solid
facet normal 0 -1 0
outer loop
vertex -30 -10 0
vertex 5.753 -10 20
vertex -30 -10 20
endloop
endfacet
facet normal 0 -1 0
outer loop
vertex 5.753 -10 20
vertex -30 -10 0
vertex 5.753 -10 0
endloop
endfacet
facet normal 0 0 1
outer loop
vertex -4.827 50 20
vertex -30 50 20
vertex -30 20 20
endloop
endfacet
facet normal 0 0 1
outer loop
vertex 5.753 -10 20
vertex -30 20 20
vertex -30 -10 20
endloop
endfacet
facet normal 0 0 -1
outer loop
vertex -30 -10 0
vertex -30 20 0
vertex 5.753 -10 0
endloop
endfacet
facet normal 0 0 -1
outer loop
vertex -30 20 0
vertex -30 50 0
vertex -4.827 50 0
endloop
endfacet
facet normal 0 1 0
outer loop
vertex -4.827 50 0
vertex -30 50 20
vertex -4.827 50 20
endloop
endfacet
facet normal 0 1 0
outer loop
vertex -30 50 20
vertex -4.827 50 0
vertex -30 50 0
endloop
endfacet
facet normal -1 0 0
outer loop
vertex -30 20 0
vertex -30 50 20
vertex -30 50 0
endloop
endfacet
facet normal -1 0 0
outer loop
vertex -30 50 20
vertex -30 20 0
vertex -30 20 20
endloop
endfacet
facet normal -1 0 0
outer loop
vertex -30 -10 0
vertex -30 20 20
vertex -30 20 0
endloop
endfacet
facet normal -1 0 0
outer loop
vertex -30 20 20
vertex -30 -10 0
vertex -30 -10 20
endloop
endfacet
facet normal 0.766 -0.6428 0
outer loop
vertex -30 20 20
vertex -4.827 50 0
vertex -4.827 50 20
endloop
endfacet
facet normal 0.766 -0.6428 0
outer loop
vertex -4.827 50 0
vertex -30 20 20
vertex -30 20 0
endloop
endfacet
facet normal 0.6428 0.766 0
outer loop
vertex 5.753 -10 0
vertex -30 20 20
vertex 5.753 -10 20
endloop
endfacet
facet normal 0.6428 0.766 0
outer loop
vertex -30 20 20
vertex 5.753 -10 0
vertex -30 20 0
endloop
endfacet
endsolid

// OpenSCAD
translate([-30,50,0])
scale([3,3,1])
rotate([0,0,-90]) {
    difference() {
        cube([20, 20, 20]);
        translate([10, 0, -1]) {
            rotate([0,0,50]) {
                cube([30, 30, 30]);
            }
        }
    }
}
